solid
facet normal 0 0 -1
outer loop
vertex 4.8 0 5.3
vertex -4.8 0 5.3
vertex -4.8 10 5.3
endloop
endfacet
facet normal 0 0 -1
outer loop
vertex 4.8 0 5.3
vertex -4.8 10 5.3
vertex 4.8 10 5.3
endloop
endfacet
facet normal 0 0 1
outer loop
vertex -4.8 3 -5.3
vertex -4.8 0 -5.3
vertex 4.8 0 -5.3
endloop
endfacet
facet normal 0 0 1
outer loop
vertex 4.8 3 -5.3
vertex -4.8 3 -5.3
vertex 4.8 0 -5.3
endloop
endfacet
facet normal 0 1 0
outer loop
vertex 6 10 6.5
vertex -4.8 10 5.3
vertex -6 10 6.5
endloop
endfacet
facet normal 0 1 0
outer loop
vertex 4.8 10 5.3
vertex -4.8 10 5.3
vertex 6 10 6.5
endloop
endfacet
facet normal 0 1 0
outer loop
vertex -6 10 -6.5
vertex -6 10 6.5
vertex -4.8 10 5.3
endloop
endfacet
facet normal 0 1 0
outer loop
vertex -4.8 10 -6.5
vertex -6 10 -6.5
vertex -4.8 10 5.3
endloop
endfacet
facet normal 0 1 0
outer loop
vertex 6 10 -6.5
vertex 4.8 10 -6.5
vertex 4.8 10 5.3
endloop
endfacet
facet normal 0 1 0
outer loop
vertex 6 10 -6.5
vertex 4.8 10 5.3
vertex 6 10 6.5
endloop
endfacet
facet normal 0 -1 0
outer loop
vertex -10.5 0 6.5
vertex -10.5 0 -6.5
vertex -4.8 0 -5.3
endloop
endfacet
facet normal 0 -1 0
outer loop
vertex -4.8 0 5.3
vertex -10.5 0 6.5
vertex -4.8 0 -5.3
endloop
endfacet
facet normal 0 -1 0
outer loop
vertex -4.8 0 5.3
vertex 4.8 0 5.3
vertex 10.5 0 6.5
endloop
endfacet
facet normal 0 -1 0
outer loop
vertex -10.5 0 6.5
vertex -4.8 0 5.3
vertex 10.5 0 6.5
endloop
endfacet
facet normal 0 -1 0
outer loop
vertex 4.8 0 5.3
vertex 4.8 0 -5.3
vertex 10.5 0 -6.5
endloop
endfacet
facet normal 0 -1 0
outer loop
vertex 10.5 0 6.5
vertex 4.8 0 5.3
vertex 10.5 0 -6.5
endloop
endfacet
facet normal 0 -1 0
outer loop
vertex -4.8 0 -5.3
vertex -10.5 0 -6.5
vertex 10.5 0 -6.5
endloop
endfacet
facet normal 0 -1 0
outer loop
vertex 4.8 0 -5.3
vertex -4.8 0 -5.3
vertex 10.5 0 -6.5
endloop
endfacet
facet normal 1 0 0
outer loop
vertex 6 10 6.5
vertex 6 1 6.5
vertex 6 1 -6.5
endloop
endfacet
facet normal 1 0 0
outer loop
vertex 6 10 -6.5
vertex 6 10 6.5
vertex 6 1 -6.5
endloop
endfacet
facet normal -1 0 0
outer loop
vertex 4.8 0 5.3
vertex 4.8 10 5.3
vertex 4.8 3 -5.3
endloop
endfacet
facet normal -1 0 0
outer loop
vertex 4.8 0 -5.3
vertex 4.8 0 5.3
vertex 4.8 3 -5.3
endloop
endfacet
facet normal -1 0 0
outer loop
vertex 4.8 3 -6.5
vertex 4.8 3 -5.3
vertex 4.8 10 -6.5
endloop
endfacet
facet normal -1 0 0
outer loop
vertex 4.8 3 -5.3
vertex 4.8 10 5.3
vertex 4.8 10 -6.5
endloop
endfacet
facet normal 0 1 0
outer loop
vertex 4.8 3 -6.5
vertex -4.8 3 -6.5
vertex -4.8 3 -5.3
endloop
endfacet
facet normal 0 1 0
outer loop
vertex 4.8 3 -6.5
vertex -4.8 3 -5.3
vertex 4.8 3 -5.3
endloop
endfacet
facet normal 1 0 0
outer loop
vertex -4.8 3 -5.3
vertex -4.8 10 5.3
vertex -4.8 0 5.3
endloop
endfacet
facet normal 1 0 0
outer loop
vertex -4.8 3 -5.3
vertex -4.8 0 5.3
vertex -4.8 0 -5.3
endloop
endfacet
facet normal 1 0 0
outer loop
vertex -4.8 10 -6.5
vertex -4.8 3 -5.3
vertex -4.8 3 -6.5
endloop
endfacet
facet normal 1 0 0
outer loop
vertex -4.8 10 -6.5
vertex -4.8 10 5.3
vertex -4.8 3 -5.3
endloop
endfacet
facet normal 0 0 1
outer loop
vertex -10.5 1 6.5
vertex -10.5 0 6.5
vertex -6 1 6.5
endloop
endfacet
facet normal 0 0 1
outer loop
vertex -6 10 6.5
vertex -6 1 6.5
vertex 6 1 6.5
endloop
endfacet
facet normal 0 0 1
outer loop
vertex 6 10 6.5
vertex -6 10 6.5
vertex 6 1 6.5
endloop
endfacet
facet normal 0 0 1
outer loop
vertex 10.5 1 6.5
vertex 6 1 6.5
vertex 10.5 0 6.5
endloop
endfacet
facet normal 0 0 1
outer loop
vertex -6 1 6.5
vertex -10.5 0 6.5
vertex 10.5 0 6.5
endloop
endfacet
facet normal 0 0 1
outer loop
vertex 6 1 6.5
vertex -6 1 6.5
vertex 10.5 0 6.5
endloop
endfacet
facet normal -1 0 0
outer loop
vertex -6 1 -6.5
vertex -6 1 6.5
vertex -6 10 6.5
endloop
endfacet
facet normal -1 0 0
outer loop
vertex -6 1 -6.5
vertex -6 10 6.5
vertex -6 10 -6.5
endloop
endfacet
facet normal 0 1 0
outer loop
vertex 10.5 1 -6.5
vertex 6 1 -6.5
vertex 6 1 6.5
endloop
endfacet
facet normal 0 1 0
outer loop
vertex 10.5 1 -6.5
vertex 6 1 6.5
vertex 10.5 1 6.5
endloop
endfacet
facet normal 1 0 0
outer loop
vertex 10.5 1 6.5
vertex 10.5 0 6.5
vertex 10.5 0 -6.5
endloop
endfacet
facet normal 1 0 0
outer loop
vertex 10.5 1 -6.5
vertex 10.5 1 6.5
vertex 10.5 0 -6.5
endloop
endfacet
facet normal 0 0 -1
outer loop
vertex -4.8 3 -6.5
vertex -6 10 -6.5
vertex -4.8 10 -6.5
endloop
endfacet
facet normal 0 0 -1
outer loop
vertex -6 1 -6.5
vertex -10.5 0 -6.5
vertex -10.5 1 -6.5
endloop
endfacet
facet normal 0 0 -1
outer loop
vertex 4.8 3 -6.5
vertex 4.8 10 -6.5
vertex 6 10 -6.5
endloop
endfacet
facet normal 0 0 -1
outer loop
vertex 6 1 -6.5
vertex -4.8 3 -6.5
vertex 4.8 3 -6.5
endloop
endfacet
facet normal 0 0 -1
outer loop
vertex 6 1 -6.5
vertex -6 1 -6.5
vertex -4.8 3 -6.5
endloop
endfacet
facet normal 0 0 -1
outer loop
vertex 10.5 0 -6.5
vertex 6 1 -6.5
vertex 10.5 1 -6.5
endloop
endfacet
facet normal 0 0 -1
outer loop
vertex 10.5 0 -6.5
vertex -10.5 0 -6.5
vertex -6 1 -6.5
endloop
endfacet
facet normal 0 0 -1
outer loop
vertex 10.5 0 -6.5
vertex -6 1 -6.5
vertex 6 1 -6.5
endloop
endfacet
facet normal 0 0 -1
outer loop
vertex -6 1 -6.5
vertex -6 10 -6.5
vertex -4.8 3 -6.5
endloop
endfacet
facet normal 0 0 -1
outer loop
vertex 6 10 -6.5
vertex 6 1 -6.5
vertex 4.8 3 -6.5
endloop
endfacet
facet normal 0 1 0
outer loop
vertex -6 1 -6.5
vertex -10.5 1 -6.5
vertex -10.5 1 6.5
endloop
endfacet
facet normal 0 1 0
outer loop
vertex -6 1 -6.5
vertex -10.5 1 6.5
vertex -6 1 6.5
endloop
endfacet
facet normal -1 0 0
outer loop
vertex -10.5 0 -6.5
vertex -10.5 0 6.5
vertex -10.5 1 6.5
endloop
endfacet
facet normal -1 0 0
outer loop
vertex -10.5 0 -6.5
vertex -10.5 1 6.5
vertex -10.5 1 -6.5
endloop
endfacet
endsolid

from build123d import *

# Parameters (mm, degrees)
SKETCH1_W           = 12
SKETCH1_H           = 13
SKETCH1_W_2         = 9.6
SKETCH1_H_2         = 10.6
BOSS_EXTRUDE1_DEPTH = 10
SKETCH2_W           = 4.5
SKETCH2_H           = 13
BOSS_EXTRUDE2_DEPTH = 1
SKETCH3_W           = 9.6
SKETCH3_H           = 1.2
CUT_EXTRUDE1_DEPTH  = 7


with BuildPart() as part:
    # Sketch1 → Boss-Extrude1 (new body)
    with BuildSketch(Plane(origin=(0, 0, 0), x_dir=(1, 0, 0), z_dir=(0, 1, 0))):
        Rectangle(SKETCH1_W, SKETCH1_H)
        Rectangle(SKETCH1_W_2, SKETCH1_H_2, mode=Mode.SUBTRACT)
    extrude(amount=BOSS_EXTRUDE1_DEPTH)

    # Sketch2 → Boss-Extrude2 (add)
    with BuildSketch(Plane(origin=(0, 0, 0), x_dir=(1, 0, 0), z_dir=(0, 1, 0))):
        with Locations((-8.25, 0)):
            Rectangle(SKETCH2_W, SKETCH2_H)
        with Locations((8.25, 0)):
            Rectangle(SKETCH2_W, SKETCH2_H)
    extrude(amount=BOSS_EXTRUDE2_DEPTH)

    # Sketch3 → Cut-Extrude1 (cut)
    with BuildSketch(Plane(origin=(0, 10, 0), x_dir=(1, 0, 0), z_dir=(0, 1, 0))):
        with Locations((0, 5.9)):
            Rectangle(SKETCH3_W, SKETCH3_H)
    extrude(amount=-CUT_EXTRUDE1_DEPTH, mode=Mode.SUBTRACT)


solid = part.part
